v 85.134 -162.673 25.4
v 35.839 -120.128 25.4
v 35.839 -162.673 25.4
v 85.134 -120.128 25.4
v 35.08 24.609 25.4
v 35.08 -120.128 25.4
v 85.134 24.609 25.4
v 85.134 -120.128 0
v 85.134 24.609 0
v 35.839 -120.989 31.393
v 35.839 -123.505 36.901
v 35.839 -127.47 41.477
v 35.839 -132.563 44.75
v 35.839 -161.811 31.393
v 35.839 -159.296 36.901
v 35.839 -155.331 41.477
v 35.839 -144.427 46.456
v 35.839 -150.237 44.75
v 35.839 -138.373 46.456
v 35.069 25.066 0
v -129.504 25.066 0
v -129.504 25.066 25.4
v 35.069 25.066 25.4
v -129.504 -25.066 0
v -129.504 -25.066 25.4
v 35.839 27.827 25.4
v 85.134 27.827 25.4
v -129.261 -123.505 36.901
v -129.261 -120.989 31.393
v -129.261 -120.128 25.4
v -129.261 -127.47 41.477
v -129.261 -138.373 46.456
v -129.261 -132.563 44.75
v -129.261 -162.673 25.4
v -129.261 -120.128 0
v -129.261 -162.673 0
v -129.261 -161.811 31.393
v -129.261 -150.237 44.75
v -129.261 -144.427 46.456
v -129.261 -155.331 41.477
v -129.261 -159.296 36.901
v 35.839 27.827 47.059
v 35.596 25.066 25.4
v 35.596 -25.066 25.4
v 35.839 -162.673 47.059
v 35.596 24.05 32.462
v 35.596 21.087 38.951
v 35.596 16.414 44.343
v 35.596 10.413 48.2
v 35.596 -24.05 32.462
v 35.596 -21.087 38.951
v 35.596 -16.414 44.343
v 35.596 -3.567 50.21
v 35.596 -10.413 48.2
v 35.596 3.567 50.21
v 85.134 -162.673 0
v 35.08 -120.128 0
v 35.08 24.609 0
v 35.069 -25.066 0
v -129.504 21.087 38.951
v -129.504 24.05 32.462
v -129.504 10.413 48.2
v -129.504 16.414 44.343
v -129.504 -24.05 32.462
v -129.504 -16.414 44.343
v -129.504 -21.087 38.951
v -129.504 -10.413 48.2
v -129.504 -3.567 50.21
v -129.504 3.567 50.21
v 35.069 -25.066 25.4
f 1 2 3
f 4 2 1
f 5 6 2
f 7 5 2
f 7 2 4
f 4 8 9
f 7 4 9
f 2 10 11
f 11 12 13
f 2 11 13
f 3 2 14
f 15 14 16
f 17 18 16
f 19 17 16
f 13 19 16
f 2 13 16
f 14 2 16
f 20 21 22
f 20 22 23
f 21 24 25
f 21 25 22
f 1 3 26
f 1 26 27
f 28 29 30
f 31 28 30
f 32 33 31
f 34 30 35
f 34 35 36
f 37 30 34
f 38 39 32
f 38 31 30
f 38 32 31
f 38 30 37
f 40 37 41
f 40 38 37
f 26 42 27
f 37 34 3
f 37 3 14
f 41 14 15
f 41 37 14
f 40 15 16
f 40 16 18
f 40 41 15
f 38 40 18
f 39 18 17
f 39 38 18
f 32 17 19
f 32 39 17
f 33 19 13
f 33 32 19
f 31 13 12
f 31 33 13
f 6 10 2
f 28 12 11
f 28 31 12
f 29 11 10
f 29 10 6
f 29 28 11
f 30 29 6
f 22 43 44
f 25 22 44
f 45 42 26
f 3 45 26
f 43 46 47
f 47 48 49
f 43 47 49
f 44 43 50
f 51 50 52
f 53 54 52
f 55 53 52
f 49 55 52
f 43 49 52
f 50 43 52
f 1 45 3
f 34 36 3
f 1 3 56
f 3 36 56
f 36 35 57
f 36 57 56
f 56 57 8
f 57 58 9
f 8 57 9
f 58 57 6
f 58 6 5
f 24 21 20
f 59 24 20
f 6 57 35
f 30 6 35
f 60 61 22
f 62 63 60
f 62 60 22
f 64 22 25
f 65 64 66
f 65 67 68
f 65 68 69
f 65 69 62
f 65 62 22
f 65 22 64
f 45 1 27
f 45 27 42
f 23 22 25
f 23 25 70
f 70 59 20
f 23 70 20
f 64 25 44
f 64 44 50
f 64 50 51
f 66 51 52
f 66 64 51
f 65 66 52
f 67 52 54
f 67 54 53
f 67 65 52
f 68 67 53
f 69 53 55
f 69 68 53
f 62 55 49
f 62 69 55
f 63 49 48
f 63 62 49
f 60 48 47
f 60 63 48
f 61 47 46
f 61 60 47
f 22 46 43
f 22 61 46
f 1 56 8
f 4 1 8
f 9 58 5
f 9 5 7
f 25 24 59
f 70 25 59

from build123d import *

# Parameters (mm, degrees)
F0_W     = 164.572999
F0_H     = 50.131164
F1_DEPTH = 25.4
F2_W     = 50.053165
F2_H     = 144.737036
F3_DEPTH = 25.4
F5_DEPTH = 165.1
F7_DEPTH = 190.5
F9_DEPTH = 165.1


with BuildPart() as f1:
    # F0 (on Top) → F1 (new body)
    with BuildSketch(Plane.XY):
        with Locations((-47.217171, 0)):
            Rectangle(F0_W, F0_H)
    extrude(amount=F1_DEPTH)


with BuildPart() as f3:
    # F2 (on Top) → F3 (new body)
    with BuildSketch(Plane.XY):
        with Locations((60.10697, -47.759071)):
            Rectangle(F2_W, F2_H)
        Polygon((85.133553, -120.127589), (35.080388, -120.127589), (-129.260778, -120.127589), (-129.260778, -162.672564), (85.133553, -162.672564), align=None)
    extrude(amount=F3_DEPTH)

    # F4 (on face) → F5 (join)
    with BuildSketch(Plane(origin=(-129.260778, 0, 0), x_dir=(0, -1, 0), z_dir=(-1, 0, 0))):
        with BuildLine():
            Line((120.127589, 25.4), (162.672564, 25.4))
            ThreePointArc((162.672564, 25.4), (141.400076, 46.672488), (120.127589, 25.4))
        make_face()
    extrude(amount=-F5_DEPTH)


with BuildPart() as f7:
    # F6 (on face) → F7 (new body)
    with BuildSketch(Plane.XZ.offset(162.672564)):
        Polygon((35.839222, 47.058806), (35.839222, 25.4), (85.133553, 25.4), align=None)
    extrude(amount=-F7_DEPTH)


with BuildPart() as f9:
    # F8 (on face) → F9 (new body)
    with BuildSketch(Plane(origin=(-129.503671, 0, 0), x_dir=(0, -1, 0), z_dir=(-1, 0, 0))):
        with BuildLine():
            Line((-25.065582, 25.4), (25.065582, 25.4))
            ThreePointArc((25.065582, 25.4), (0, 50.465582), (-25.065582, 25.4))
        make_face()
    extrude(amount=-F9_DEPTH)


solid = Compound([f1.part, f3.part, f7.part, f9.part])
